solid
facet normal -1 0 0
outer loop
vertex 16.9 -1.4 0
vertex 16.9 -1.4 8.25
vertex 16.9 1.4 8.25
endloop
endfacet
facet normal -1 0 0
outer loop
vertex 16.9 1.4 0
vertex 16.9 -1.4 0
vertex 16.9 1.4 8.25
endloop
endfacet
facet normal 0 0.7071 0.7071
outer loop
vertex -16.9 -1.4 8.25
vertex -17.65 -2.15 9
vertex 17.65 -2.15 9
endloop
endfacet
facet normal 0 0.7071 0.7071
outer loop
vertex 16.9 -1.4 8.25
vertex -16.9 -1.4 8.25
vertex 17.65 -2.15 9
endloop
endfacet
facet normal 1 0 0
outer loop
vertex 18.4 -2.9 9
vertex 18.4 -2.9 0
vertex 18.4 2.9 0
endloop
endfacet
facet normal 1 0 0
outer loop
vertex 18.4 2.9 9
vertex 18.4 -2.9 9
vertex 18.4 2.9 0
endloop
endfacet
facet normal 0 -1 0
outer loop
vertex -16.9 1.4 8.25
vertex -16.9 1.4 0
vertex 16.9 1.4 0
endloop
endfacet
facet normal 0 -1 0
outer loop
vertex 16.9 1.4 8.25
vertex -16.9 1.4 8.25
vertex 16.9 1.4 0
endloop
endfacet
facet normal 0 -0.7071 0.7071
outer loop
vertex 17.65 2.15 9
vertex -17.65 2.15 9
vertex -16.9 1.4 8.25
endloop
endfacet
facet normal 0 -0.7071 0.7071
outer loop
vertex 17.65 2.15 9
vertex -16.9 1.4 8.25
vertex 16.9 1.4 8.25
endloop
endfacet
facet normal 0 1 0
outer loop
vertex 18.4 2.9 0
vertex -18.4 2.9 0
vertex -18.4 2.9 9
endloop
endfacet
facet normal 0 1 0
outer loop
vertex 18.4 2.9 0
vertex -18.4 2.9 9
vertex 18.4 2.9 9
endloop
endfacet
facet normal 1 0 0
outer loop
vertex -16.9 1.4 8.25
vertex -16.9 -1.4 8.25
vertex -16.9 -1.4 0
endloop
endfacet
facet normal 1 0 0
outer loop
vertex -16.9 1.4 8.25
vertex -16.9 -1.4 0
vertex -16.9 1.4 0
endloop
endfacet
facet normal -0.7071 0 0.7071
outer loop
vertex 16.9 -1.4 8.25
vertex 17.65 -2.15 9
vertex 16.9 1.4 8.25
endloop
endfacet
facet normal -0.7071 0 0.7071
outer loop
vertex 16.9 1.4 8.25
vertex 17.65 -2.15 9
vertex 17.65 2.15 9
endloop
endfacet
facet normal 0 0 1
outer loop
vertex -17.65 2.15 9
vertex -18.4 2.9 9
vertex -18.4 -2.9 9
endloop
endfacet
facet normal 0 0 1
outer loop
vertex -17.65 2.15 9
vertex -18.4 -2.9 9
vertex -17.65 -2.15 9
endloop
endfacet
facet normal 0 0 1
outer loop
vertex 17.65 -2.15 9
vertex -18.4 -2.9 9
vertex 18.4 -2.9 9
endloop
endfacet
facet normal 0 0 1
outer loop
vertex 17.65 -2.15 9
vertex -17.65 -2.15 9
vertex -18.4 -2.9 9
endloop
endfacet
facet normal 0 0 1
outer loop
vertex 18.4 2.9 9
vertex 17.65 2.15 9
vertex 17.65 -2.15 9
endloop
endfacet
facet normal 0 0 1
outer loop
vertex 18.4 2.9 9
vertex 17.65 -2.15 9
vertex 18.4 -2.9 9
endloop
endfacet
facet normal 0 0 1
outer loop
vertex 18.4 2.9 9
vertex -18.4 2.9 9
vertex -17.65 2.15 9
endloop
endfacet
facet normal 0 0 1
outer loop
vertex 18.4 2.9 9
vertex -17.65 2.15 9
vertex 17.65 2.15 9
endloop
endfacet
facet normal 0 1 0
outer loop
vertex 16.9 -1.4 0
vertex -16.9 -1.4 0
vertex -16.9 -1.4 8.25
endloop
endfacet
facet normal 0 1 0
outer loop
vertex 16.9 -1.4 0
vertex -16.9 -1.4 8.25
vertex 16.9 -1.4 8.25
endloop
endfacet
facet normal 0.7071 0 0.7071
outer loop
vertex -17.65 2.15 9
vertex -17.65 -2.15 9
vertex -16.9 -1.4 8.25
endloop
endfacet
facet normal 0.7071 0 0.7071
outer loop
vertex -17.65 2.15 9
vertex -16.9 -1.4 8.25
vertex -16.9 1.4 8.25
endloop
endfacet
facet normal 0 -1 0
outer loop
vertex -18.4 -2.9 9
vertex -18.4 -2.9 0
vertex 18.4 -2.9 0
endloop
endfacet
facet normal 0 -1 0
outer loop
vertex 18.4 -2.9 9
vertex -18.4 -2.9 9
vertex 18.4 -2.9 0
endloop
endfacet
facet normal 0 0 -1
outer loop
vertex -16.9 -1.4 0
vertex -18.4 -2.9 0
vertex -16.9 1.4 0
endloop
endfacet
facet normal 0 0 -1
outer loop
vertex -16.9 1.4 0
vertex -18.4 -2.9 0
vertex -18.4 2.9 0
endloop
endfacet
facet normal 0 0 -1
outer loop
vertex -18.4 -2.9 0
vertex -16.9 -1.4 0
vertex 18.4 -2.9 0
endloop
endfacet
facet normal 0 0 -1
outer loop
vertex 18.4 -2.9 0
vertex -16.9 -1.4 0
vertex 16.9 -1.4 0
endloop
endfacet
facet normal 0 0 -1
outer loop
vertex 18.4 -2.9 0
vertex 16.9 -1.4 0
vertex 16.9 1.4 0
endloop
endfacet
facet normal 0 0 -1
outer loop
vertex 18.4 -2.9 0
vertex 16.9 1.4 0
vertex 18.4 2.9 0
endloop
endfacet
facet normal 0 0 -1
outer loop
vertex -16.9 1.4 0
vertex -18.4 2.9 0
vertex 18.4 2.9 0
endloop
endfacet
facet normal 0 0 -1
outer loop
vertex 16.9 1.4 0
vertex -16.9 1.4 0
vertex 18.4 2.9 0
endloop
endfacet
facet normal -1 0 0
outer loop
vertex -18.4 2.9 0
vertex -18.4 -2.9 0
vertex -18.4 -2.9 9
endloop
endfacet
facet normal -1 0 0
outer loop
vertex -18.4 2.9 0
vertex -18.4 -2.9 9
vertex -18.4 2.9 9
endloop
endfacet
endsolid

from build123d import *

# Parameters (mm, degrees)
SKETCH_W     = 36.8
SKETCH_H     = 5.8
SKETCH_W_2   = 33.8
SKETCH_H_2   = 2.8
PAD_DEPTH    = 9
CHAMFER_SIZE = 0.75


with BuildPart() as part:
    # Sketch → Pad (new body)
    with BuildSketch(Plane.XY):
        Rectangle(SKETCH_W, SKETCH_H)
        Rectangle(SKETCH_W_2, SKETCH_H_2, mode=Mode.SUBTRACT)
    extrude(amount=PAD_DEPTH)

    # Chamfer
    chamfer_edges = [part.edges().sort_by_distance(p)[0] for p in [
        (0, 1.4, 9),
        (0, -1.4, 9),
        (-16.9, 0, 9),
        (16.9, 0, 9),
    ]]
    chamfer(chamfer_edges, length=CHAMFER_SIZE)


solid = part.part
